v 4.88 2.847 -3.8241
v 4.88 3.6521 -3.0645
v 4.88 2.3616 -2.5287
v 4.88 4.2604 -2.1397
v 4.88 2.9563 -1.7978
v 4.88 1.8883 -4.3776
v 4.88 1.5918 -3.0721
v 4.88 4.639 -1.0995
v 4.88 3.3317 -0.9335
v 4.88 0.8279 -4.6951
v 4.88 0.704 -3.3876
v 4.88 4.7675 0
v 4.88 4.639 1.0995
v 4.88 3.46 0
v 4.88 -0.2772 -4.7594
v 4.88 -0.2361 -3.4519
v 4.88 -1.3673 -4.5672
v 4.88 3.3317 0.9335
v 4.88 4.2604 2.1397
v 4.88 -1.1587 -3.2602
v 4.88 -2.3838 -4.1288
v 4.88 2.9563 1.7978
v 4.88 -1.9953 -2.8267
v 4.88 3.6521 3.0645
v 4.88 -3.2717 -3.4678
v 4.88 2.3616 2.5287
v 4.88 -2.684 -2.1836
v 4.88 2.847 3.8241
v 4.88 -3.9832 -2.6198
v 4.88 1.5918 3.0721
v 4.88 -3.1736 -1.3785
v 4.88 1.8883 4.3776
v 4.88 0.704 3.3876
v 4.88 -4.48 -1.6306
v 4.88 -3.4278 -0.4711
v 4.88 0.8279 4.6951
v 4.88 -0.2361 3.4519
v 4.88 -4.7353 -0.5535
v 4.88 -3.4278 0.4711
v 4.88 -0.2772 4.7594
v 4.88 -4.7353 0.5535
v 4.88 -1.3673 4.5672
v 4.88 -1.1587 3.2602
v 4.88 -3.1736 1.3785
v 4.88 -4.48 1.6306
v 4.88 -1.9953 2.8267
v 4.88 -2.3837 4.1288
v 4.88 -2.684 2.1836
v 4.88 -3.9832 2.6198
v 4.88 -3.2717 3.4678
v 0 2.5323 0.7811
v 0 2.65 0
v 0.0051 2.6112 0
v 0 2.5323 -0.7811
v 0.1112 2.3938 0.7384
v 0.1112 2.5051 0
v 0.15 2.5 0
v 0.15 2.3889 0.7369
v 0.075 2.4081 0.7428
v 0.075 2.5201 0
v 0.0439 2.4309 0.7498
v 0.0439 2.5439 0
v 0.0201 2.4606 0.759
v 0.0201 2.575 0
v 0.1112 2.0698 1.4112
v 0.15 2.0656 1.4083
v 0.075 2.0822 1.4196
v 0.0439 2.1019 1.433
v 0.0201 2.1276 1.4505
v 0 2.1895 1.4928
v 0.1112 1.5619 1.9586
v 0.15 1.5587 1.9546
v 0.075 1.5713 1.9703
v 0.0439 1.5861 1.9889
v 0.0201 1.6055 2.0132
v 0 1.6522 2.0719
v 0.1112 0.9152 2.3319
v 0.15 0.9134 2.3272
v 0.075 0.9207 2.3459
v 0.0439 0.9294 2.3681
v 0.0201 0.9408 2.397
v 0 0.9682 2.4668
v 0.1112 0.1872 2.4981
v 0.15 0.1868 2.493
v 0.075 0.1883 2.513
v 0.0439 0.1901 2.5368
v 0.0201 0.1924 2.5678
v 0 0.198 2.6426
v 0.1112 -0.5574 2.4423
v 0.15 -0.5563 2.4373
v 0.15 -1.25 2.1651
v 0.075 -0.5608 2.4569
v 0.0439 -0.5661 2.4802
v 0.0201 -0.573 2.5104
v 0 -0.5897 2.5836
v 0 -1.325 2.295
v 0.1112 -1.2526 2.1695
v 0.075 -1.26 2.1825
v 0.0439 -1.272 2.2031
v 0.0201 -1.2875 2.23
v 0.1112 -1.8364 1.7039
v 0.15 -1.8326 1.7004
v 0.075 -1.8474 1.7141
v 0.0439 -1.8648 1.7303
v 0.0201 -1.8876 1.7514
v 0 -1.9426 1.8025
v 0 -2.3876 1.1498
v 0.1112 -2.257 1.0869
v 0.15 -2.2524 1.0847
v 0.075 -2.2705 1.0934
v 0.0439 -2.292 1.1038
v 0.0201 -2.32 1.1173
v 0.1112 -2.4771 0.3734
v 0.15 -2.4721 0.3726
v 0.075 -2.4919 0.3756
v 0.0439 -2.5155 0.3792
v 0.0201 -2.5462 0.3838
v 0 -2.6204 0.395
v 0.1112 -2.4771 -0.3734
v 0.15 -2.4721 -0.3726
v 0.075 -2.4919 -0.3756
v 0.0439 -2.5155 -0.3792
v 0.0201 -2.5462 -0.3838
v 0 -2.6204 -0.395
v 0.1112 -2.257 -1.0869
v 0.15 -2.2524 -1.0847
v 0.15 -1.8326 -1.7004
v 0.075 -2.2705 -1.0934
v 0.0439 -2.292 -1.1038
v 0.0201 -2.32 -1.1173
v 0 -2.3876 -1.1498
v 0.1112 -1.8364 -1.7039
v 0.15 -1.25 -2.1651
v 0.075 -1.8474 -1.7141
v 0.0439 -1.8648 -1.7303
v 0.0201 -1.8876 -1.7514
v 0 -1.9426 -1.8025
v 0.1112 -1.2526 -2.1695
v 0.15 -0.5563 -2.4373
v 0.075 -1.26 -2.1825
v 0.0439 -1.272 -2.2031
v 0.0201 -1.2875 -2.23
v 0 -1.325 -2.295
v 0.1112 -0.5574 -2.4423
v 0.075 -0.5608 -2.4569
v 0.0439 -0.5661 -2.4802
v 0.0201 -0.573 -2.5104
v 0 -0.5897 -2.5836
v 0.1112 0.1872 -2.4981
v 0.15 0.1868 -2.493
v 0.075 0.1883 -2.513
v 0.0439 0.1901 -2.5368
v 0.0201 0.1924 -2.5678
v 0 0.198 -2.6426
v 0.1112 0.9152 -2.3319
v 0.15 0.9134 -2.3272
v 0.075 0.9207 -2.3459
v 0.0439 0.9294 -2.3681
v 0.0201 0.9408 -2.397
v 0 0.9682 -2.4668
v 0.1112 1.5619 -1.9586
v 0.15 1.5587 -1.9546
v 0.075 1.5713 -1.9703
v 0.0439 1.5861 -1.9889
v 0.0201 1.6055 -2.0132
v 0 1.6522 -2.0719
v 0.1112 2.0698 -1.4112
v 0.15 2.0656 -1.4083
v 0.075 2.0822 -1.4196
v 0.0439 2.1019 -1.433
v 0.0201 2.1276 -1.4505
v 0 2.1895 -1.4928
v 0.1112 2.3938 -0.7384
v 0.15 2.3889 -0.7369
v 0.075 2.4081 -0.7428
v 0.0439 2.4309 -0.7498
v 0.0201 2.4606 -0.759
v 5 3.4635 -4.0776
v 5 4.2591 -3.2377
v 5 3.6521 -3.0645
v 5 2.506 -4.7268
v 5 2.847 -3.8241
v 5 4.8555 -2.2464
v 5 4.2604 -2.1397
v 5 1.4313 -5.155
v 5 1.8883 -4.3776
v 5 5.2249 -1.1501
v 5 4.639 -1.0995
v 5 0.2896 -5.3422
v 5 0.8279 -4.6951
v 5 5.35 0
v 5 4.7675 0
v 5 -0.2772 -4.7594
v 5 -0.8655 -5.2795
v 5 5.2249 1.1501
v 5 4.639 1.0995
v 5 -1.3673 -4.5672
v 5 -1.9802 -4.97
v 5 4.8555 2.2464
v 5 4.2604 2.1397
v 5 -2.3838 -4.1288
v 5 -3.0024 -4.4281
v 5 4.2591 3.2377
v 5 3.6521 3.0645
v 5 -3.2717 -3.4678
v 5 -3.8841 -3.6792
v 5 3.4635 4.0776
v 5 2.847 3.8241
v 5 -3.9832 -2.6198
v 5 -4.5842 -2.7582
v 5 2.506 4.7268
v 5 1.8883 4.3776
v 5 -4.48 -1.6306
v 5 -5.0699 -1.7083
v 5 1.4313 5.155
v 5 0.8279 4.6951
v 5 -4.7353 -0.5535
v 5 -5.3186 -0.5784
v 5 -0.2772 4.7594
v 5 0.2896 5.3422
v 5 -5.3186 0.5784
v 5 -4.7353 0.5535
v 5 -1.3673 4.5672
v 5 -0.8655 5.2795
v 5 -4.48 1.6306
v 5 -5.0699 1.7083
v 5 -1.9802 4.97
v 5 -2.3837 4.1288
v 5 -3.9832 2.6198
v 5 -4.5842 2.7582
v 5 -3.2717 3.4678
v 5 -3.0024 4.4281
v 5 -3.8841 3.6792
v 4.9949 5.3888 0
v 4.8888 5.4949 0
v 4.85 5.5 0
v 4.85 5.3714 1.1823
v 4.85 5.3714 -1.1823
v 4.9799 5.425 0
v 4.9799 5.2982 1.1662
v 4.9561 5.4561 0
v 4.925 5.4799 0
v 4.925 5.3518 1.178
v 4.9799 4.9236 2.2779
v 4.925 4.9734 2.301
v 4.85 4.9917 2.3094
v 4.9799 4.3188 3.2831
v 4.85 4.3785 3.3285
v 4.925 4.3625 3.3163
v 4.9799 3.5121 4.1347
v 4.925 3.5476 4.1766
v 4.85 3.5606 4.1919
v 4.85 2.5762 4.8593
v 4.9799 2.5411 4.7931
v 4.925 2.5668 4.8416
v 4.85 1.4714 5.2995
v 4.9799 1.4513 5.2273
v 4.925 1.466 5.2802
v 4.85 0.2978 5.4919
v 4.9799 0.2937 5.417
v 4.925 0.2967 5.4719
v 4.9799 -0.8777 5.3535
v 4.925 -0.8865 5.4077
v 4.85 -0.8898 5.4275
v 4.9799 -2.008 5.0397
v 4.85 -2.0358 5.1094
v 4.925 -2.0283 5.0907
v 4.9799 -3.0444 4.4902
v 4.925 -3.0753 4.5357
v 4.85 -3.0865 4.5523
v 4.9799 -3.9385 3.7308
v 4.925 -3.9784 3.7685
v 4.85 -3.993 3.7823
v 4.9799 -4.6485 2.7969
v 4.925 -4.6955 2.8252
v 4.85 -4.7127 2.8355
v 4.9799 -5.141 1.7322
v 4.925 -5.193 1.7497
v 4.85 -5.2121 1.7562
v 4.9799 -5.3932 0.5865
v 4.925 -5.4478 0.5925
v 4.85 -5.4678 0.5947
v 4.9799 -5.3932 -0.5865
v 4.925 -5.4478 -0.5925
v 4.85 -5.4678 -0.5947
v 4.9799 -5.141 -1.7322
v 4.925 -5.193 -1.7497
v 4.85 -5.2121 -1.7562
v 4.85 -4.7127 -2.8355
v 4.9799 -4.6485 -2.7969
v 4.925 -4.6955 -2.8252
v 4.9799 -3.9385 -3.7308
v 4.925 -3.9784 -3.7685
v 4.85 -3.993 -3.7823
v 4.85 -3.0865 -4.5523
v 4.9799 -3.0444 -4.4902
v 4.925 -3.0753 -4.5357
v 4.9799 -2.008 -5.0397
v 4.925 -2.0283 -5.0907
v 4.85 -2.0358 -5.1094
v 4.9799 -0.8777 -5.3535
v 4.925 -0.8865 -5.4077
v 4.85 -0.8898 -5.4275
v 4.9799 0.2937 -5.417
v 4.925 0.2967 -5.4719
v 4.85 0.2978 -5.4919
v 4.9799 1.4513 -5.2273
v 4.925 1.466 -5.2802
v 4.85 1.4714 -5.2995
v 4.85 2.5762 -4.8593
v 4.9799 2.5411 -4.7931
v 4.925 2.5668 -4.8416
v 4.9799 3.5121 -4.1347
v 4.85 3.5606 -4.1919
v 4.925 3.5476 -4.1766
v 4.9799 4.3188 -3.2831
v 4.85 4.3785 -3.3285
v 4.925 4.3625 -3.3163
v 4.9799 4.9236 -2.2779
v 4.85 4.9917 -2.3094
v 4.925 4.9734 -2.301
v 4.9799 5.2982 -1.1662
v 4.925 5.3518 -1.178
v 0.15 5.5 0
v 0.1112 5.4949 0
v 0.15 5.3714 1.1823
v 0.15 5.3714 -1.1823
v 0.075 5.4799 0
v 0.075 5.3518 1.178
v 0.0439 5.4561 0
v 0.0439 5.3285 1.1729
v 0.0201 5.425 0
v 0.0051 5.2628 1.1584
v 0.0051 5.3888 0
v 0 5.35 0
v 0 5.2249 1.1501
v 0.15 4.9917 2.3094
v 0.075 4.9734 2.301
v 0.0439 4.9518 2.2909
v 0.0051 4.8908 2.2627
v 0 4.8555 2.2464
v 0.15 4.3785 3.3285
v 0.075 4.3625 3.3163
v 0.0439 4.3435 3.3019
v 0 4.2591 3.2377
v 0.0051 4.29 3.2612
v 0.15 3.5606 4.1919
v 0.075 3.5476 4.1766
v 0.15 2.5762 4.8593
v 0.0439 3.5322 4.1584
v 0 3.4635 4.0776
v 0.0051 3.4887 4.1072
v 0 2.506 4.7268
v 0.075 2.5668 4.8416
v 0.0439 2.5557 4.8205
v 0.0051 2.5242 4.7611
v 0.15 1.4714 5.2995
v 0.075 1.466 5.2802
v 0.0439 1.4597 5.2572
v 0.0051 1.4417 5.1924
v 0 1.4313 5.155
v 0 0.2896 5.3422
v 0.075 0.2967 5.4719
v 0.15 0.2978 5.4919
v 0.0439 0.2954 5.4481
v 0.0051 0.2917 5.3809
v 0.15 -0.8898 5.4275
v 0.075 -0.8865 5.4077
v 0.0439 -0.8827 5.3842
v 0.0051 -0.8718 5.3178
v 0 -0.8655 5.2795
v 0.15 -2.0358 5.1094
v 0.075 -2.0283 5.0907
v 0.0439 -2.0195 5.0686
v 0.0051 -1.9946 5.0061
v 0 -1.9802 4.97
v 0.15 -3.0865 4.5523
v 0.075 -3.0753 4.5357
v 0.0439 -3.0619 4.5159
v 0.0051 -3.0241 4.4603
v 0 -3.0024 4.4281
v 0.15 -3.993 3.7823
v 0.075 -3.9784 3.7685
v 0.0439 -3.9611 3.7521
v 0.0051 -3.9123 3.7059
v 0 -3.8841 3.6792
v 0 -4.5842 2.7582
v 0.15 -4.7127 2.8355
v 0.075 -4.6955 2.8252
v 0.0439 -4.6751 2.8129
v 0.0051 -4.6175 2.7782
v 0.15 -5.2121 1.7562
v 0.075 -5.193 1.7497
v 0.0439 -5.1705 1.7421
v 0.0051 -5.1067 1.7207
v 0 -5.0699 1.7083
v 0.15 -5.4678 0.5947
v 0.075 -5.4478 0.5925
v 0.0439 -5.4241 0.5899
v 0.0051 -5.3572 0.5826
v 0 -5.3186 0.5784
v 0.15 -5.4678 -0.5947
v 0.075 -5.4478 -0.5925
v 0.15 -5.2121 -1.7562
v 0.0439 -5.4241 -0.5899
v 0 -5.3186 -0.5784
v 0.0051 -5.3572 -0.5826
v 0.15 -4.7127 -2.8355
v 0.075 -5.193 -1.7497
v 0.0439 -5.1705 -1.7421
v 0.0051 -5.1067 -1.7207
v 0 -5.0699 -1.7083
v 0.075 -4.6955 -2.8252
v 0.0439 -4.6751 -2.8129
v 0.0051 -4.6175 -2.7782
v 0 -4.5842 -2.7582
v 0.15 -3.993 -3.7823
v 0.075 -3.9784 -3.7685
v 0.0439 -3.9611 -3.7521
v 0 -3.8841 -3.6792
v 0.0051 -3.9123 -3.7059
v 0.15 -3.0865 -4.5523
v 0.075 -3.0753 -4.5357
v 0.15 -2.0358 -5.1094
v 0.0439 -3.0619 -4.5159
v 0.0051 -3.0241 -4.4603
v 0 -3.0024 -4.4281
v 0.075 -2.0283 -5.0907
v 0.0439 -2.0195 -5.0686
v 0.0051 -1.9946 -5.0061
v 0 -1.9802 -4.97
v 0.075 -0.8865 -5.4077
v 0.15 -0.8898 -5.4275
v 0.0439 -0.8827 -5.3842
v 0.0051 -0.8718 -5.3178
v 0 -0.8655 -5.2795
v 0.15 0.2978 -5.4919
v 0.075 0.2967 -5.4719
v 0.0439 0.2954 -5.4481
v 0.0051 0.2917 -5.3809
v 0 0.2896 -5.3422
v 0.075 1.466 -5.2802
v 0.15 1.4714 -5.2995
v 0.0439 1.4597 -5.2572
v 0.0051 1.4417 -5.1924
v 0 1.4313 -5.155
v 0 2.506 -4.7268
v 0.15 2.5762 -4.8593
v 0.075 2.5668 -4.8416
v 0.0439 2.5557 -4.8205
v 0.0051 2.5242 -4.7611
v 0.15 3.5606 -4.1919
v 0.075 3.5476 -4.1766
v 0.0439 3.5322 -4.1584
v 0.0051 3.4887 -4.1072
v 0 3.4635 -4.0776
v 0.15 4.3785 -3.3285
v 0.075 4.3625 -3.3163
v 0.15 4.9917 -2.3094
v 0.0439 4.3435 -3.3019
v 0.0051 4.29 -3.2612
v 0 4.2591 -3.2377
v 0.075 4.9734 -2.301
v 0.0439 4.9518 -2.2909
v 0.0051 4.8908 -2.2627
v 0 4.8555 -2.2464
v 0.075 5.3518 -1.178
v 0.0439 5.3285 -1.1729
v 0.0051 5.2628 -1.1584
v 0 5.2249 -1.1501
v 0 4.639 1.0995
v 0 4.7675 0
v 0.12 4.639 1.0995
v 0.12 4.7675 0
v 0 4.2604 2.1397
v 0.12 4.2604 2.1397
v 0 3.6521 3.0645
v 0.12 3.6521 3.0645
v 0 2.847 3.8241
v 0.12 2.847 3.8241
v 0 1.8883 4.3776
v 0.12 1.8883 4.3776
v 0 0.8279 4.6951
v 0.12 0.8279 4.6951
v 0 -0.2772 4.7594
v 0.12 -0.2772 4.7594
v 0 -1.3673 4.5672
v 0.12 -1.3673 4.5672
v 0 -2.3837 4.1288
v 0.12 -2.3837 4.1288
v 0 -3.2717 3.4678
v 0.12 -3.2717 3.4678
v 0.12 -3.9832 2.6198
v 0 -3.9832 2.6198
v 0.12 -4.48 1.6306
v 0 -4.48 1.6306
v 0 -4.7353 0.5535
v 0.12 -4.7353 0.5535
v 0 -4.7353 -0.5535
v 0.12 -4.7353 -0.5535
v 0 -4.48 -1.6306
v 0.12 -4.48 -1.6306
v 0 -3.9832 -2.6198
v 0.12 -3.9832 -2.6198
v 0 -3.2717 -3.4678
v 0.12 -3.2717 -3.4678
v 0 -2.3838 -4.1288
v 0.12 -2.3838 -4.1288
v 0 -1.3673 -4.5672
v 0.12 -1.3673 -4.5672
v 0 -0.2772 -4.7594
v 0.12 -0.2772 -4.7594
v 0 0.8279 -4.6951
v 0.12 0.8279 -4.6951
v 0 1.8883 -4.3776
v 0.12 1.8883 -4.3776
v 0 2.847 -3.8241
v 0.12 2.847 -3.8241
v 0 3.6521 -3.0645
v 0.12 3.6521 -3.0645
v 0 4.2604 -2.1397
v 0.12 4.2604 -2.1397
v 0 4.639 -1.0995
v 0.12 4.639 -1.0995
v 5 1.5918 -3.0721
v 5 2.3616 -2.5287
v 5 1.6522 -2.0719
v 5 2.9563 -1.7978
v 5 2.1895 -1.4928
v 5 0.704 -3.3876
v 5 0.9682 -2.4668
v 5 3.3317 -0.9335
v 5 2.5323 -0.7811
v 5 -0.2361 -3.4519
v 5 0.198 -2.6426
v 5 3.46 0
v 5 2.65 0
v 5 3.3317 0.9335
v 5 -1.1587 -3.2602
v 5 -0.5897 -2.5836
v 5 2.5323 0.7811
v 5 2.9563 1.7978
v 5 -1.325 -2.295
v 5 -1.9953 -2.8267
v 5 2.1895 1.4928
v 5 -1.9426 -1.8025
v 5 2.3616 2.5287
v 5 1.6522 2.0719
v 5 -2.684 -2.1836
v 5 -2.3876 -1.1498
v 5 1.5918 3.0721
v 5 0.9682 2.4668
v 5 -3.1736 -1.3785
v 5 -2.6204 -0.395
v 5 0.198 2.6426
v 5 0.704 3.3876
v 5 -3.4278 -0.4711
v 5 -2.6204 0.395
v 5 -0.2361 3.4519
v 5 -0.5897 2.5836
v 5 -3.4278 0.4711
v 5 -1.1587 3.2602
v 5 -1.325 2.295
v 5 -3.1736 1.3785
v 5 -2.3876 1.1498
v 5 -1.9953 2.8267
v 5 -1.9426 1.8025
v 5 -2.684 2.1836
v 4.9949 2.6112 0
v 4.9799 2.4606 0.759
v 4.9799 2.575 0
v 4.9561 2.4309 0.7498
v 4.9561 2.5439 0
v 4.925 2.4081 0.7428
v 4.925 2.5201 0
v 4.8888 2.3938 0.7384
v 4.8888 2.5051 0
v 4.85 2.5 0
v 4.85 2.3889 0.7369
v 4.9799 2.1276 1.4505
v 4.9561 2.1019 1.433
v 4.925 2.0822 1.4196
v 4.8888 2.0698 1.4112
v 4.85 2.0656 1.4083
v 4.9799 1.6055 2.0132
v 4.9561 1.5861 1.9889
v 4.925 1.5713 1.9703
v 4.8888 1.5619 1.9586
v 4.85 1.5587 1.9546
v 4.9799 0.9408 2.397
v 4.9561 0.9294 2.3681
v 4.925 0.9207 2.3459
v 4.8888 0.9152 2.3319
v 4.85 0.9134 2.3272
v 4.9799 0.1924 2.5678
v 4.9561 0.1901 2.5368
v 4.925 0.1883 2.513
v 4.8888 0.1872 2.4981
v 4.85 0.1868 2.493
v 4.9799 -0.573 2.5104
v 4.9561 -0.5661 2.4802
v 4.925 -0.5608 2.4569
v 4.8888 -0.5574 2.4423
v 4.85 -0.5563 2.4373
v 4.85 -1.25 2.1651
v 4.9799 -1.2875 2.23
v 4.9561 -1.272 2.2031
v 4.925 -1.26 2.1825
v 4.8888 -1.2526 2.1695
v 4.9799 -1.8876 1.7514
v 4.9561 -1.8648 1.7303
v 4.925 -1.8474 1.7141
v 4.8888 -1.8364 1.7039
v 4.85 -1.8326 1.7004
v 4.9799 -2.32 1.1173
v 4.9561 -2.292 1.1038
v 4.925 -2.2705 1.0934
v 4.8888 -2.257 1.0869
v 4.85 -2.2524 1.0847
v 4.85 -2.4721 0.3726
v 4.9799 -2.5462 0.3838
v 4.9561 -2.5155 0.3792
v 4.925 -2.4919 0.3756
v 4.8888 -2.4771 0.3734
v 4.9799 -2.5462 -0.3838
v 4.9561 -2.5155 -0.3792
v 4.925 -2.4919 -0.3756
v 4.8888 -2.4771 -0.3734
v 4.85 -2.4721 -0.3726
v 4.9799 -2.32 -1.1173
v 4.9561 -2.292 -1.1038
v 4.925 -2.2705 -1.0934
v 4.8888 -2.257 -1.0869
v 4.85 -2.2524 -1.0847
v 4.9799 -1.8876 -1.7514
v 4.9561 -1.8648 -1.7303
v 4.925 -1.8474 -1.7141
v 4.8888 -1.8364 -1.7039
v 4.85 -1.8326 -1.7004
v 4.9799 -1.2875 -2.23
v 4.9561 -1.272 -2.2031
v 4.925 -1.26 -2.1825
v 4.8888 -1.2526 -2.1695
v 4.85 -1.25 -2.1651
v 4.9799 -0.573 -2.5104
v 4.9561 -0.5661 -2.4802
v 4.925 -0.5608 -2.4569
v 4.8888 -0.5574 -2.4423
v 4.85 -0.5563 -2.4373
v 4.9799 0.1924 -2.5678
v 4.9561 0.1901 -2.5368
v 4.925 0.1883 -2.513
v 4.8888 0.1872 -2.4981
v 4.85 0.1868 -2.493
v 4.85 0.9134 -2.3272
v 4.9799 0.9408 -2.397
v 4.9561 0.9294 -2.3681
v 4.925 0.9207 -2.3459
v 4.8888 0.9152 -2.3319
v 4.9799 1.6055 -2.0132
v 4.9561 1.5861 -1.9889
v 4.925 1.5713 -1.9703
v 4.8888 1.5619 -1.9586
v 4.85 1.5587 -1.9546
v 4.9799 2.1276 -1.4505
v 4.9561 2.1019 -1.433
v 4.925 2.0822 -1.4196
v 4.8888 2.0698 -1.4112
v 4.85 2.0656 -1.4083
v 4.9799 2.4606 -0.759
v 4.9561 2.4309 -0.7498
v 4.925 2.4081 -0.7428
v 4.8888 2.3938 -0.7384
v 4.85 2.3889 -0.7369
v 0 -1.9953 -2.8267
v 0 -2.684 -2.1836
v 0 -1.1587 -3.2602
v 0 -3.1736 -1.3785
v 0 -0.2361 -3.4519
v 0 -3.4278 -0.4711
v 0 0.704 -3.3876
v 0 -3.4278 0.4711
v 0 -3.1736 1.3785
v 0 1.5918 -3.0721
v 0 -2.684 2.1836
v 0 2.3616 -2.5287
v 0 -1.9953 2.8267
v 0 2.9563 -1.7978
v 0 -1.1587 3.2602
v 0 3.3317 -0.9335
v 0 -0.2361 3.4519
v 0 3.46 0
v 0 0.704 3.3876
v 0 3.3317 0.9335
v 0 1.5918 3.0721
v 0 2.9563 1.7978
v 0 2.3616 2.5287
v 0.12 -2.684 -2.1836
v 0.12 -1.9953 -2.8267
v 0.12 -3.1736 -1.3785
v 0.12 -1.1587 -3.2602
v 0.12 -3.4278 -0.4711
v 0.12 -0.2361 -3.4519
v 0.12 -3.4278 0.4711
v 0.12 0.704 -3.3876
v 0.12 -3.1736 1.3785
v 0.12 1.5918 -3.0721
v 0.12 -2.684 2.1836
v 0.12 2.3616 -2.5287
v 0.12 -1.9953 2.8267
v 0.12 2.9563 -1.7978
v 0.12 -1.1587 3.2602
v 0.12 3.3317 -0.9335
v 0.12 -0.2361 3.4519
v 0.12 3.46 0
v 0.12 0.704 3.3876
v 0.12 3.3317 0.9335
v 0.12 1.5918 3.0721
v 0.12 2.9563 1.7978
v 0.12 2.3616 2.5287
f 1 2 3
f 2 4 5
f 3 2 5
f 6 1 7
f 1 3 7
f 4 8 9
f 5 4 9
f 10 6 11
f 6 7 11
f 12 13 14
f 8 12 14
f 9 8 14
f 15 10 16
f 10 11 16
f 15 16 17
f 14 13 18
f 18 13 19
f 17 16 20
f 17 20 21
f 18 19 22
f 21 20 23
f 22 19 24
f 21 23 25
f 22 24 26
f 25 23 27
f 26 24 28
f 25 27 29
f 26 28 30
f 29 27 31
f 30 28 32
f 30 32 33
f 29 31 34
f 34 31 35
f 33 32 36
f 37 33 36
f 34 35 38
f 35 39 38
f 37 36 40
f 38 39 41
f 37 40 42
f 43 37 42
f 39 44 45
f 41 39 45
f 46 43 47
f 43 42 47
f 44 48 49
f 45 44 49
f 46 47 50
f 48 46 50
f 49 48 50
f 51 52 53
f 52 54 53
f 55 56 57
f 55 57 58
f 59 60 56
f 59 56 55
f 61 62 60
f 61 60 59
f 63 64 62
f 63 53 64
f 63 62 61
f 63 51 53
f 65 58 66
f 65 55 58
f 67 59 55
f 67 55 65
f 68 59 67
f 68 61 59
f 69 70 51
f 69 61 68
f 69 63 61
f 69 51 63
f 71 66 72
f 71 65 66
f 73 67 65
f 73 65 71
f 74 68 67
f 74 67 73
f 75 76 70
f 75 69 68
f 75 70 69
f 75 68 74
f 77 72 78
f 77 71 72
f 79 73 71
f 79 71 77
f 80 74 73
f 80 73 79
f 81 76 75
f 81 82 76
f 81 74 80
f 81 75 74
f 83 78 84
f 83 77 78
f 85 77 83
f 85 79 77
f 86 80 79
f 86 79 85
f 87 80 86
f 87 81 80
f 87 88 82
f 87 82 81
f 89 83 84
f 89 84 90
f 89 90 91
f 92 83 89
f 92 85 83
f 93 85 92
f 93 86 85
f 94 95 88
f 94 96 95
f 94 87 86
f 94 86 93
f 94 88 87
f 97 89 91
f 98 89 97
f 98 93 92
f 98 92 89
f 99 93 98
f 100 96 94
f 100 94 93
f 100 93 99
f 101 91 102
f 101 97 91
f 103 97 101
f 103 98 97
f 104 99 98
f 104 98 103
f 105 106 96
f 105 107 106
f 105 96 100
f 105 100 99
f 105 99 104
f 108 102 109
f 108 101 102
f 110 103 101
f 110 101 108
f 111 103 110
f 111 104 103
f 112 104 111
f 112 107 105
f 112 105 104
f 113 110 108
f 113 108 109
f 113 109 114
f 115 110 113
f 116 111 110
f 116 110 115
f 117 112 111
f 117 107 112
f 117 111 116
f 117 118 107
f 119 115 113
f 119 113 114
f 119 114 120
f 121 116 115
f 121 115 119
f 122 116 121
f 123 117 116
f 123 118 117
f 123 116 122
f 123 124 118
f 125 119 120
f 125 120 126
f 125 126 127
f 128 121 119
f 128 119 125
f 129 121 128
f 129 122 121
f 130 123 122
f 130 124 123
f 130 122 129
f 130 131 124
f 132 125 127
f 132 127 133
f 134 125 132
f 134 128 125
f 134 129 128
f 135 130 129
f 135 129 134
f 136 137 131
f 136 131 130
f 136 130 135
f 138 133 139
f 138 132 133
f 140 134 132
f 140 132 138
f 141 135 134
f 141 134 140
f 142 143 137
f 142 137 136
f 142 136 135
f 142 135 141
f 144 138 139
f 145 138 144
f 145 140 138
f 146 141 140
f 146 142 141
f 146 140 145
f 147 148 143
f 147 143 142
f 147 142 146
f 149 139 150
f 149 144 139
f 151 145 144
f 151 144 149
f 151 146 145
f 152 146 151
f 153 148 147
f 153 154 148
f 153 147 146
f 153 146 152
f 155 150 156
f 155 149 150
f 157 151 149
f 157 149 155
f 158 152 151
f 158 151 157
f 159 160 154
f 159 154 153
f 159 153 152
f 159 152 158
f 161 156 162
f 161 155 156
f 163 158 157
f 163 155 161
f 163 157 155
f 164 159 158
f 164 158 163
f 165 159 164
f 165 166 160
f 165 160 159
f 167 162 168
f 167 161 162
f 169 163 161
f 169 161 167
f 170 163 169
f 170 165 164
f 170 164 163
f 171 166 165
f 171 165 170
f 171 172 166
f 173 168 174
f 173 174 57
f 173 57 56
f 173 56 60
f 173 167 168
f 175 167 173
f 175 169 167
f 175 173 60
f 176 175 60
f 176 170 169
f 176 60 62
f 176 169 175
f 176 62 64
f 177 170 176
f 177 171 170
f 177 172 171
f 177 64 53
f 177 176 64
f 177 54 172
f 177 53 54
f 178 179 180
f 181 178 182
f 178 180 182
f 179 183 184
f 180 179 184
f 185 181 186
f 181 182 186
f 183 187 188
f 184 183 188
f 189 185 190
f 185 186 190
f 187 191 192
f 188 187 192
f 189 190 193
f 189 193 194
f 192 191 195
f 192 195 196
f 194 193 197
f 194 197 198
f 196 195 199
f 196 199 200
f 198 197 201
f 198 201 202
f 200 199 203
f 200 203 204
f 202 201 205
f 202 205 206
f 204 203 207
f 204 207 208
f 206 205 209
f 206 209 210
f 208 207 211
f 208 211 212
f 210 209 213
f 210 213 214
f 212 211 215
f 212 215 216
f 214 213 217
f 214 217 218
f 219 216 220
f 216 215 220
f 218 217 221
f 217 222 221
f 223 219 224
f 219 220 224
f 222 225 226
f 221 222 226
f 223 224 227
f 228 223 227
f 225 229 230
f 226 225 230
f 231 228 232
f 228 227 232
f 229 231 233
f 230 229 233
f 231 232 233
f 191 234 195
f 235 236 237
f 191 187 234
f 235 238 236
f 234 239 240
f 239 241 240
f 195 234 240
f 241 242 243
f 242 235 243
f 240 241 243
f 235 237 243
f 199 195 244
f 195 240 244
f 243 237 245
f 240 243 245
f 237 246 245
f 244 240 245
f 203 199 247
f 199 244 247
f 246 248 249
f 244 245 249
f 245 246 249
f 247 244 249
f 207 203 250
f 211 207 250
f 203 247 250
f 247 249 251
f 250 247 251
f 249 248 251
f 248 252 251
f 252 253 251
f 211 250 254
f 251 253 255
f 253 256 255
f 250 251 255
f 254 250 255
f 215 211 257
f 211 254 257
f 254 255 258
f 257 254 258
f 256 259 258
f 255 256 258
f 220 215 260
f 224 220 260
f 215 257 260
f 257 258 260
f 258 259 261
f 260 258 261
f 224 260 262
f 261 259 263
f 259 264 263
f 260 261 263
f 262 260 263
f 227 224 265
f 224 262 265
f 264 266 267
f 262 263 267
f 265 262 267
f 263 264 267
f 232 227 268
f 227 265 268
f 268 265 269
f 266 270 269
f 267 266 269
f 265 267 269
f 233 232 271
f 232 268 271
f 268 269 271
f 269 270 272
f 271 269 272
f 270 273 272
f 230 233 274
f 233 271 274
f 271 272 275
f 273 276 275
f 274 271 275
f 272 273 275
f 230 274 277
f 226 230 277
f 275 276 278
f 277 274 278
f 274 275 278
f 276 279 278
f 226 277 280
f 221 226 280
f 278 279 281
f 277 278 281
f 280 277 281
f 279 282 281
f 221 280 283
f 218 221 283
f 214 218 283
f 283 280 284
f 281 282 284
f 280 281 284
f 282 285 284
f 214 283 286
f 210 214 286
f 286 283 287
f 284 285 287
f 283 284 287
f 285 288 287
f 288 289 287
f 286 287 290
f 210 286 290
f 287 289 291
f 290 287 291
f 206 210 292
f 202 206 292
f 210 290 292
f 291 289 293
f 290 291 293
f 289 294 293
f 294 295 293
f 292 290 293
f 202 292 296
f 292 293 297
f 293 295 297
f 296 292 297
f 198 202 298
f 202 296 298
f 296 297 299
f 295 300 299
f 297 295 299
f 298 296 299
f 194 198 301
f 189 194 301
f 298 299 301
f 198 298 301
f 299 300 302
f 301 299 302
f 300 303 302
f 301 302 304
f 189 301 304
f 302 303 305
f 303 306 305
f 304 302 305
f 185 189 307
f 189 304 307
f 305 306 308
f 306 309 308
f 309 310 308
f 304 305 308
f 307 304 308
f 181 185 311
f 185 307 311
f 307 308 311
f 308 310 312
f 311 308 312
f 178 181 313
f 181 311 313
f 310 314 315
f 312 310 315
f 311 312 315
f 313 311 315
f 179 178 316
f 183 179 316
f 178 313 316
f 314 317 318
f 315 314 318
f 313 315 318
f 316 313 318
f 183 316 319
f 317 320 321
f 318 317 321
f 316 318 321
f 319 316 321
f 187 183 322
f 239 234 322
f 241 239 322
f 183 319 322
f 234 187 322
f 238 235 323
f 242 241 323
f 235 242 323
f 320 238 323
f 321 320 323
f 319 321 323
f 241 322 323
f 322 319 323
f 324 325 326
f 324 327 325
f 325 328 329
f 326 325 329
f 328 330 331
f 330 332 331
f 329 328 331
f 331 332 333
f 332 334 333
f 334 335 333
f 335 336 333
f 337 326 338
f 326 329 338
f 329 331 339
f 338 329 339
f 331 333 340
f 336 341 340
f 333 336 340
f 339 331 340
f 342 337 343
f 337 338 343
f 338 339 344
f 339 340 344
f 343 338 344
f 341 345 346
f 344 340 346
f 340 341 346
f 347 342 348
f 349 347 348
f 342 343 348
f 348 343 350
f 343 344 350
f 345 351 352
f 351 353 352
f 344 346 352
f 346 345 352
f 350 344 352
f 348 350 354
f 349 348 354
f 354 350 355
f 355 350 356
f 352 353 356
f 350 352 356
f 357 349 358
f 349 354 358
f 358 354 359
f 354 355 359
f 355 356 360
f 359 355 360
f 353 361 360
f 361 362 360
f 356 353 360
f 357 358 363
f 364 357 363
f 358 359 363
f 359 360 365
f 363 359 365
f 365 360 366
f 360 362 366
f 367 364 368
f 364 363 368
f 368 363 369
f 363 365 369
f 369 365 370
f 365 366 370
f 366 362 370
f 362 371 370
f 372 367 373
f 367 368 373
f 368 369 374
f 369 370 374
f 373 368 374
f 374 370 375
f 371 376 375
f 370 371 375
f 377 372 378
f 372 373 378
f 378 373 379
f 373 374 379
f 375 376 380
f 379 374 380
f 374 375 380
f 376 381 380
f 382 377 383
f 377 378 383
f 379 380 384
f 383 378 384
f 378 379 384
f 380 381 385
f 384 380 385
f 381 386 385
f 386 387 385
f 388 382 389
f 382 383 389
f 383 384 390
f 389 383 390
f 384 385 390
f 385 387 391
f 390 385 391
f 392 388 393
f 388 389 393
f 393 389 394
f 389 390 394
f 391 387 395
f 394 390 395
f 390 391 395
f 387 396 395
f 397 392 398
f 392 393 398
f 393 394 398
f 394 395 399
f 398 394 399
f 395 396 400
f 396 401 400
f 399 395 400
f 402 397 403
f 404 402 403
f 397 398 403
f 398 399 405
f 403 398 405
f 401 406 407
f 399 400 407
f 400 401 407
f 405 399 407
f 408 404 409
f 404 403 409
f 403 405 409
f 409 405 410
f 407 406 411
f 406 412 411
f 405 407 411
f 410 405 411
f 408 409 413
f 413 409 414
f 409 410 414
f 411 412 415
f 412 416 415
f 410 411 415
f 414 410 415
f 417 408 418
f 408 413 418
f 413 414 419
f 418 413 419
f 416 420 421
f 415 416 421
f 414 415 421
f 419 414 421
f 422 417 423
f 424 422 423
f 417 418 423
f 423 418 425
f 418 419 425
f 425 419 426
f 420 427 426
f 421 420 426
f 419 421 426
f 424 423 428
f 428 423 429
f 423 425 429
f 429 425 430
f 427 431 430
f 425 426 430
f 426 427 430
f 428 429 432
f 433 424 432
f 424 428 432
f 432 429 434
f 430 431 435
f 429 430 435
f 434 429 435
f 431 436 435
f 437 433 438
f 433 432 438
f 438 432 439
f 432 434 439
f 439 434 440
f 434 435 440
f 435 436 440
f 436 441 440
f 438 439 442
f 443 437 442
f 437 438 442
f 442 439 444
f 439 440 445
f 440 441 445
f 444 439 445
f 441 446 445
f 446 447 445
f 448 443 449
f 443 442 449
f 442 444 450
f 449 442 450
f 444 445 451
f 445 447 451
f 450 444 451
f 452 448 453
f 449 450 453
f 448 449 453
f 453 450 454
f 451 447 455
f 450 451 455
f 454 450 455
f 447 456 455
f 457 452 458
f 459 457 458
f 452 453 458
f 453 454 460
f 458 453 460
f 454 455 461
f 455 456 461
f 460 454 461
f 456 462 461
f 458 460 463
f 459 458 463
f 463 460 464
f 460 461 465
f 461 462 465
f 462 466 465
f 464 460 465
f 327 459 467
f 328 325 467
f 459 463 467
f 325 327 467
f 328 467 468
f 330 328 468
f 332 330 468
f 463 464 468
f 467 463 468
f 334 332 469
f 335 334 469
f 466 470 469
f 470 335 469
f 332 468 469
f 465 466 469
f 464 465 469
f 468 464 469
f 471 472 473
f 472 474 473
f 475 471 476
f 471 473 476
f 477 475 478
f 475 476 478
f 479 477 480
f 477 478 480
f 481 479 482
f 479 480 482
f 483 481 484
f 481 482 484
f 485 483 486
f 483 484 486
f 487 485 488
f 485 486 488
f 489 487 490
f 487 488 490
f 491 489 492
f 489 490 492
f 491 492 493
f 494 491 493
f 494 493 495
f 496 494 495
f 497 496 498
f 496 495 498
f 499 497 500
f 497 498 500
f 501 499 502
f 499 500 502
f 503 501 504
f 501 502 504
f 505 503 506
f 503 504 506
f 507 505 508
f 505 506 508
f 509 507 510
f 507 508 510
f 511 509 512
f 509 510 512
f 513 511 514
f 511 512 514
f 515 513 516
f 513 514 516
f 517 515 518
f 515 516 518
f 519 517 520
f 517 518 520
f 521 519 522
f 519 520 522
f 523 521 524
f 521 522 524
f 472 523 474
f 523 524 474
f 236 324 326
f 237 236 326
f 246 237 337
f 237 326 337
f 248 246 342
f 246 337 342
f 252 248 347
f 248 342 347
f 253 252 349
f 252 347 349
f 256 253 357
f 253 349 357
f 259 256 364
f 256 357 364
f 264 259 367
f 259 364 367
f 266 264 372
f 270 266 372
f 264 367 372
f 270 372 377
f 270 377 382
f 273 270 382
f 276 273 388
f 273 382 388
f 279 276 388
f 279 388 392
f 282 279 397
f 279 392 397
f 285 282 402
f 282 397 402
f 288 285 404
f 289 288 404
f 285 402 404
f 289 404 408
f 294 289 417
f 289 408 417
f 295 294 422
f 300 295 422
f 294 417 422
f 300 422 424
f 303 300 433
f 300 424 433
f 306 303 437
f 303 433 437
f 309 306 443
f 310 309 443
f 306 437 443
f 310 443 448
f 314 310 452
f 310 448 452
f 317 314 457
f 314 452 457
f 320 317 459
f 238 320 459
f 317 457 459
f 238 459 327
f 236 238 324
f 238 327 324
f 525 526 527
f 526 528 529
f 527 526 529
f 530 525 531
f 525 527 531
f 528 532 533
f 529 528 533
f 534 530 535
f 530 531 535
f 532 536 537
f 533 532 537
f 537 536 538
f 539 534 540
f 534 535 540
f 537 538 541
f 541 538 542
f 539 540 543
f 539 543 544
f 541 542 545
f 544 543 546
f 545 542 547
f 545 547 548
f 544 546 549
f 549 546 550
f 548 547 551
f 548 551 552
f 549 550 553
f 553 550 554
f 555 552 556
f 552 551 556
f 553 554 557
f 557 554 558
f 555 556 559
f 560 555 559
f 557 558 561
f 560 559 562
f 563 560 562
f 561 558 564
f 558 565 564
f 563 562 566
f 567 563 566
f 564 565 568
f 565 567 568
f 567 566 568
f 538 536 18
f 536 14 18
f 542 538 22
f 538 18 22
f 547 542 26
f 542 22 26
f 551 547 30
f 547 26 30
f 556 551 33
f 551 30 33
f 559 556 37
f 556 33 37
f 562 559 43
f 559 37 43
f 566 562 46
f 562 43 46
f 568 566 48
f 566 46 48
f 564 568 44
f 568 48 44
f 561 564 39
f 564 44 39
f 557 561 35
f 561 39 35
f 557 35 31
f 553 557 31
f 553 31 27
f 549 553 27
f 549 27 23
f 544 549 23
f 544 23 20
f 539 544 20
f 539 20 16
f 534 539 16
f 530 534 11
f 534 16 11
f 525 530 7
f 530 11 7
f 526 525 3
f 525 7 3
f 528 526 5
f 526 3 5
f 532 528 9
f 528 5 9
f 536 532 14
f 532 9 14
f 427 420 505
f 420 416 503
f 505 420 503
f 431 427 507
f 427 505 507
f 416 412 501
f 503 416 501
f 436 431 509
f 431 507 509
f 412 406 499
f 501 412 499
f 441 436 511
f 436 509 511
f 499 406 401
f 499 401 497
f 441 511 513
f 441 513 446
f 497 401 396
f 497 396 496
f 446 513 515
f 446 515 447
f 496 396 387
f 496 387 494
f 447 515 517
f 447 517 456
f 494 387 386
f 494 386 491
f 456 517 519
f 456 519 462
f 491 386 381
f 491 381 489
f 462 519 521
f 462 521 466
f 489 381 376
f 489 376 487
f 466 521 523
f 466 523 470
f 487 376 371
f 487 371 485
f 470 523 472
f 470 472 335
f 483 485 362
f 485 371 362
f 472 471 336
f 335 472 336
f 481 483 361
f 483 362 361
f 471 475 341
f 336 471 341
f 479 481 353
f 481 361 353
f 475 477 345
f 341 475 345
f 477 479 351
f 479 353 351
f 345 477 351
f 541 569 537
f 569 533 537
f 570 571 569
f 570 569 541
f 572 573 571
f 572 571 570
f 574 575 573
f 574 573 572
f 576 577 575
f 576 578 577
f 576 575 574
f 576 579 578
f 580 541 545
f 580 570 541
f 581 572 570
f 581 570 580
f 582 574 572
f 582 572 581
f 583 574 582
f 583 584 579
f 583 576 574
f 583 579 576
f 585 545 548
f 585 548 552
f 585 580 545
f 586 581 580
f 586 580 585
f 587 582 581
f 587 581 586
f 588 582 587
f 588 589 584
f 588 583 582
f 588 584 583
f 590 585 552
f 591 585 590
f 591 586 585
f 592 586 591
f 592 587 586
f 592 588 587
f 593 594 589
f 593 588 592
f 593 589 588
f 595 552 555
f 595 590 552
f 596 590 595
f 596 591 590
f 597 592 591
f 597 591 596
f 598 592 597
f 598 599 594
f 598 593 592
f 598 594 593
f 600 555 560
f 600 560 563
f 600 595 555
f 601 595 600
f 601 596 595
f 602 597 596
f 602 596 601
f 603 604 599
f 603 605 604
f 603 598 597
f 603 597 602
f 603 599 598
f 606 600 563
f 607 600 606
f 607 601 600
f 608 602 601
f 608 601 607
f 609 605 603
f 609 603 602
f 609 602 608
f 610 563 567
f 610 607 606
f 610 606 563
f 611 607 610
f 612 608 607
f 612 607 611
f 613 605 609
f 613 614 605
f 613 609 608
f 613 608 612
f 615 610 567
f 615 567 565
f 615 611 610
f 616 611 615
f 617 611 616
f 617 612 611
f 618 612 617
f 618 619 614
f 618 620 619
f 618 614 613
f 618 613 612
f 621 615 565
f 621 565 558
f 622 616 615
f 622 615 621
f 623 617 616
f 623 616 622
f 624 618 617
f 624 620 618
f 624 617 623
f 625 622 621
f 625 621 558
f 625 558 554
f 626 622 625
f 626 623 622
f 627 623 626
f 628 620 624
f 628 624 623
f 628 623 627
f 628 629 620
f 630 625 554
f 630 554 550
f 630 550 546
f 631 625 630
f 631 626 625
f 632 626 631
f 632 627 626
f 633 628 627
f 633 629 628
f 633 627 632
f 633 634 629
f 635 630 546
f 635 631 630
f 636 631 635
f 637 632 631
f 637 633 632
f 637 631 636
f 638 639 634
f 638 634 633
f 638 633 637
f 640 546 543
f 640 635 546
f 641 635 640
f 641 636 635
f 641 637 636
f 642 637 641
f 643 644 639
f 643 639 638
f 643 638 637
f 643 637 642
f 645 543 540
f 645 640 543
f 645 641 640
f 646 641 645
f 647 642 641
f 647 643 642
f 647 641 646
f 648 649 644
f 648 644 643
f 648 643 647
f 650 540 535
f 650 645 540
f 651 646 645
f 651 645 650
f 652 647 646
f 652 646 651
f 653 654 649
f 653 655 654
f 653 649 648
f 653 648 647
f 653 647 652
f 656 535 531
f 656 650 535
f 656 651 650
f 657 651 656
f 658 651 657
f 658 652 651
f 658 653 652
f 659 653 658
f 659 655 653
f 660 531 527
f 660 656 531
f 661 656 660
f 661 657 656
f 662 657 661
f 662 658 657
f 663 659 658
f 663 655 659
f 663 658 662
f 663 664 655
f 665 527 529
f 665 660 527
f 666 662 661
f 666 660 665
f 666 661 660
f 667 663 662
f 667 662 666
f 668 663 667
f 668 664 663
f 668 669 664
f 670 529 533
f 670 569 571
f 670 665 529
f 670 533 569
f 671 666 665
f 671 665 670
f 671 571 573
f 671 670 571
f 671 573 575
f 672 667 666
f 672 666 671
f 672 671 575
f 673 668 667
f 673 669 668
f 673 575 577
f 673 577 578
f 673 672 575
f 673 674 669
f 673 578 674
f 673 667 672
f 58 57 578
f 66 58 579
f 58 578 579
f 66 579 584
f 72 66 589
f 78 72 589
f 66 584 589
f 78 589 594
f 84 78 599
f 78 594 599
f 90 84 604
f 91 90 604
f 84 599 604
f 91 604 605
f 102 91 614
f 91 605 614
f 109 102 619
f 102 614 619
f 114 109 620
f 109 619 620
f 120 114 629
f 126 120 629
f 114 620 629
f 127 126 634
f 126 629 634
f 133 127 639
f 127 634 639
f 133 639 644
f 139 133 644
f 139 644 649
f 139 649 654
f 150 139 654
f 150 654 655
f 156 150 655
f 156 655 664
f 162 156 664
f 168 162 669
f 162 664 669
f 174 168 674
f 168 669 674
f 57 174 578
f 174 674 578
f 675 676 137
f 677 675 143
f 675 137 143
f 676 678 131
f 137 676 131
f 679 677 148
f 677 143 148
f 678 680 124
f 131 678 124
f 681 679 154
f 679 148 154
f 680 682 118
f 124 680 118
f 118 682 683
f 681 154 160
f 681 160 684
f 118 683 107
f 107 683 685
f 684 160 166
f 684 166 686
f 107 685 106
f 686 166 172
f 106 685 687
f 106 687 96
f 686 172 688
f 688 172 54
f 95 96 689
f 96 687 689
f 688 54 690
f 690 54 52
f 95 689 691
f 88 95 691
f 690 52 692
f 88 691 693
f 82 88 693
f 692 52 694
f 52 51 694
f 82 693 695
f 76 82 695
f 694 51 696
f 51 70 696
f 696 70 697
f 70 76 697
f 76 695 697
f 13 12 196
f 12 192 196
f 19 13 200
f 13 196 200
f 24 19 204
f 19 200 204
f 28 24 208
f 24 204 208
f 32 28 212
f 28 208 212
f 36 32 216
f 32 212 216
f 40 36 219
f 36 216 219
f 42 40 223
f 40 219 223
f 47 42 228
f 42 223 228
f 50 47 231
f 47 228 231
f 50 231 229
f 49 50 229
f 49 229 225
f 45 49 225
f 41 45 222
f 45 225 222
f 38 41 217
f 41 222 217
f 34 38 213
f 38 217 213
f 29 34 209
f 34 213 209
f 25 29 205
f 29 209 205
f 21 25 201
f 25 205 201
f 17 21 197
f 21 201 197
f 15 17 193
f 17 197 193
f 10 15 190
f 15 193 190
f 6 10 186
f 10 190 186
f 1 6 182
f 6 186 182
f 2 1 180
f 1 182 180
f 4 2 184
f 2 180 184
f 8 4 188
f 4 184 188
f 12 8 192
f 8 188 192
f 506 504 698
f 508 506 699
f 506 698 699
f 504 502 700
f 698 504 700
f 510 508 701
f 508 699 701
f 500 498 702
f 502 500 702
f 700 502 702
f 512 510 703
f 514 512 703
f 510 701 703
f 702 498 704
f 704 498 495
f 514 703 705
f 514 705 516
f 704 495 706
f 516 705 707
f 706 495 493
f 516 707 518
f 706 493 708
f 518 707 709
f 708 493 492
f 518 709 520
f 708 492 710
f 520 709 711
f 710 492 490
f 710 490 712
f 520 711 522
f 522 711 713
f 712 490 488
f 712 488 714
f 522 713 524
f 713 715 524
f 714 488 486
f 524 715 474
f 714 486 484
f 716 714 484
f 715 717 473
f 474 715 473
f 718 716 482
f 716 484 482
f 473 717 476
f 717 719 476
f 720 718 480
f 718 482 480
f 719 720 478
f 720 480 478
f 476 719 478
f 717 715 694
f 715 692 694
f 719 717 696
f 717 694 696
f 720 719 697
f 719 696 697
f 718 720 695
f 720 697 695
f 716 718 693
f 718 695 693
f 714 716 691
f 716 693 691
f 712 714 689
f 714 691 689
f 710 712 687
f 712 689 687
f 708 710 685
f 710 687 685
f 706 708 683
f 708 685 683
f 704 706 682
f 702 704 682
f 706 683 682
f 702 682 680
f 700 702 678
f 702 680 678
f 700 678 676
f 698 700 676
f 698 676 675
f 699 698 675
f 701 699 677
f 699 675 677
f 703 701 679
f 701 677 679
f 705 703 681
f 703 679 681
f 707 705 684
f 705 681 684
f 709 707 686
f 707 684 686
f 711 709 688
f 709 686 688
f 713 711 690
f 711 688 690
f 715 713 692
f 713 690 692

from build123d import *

# Parameters (mm, degrees)
FILLET1_R = 0.15
FILLET2_R = 0.15


with BuildPart() as part:
    # Sketch1 → Revolve1 (revolve)
    with BuildSketch(Plane.XY):
        Polygon((0, 2.5), (5, 2.5), (5, 3.46), (4.88, 3.46), (4.88, 4.7675), (5, 4.7675), (5, 5.5), (0, 5.5), (0, 4.7675), (0.12, 4.7675), (0.12, 3.46), (0, 3.46), align=None)
    revolve(axis=Axis((0, 0, 0), (1, 0, 0)))

    # Fillet1
    fillet1_edges = [part.edges().sort_by_distance(p)[0] for p in [
        (0, -5.5, 0),
        (5, -5.5, 0),
    ]]
    fillet(fillet1_edges, radius=FILLET1_R)

    # Fillet2
    fillet2_edges = [part.edges().sort_by_distance(p)[0] for p in [
        (5, -2.5, 0),
        (0, -2.5, 0),
    ]]
    fillet(fillet2_edges, radius=FILLET2_R)


solid = part.part
